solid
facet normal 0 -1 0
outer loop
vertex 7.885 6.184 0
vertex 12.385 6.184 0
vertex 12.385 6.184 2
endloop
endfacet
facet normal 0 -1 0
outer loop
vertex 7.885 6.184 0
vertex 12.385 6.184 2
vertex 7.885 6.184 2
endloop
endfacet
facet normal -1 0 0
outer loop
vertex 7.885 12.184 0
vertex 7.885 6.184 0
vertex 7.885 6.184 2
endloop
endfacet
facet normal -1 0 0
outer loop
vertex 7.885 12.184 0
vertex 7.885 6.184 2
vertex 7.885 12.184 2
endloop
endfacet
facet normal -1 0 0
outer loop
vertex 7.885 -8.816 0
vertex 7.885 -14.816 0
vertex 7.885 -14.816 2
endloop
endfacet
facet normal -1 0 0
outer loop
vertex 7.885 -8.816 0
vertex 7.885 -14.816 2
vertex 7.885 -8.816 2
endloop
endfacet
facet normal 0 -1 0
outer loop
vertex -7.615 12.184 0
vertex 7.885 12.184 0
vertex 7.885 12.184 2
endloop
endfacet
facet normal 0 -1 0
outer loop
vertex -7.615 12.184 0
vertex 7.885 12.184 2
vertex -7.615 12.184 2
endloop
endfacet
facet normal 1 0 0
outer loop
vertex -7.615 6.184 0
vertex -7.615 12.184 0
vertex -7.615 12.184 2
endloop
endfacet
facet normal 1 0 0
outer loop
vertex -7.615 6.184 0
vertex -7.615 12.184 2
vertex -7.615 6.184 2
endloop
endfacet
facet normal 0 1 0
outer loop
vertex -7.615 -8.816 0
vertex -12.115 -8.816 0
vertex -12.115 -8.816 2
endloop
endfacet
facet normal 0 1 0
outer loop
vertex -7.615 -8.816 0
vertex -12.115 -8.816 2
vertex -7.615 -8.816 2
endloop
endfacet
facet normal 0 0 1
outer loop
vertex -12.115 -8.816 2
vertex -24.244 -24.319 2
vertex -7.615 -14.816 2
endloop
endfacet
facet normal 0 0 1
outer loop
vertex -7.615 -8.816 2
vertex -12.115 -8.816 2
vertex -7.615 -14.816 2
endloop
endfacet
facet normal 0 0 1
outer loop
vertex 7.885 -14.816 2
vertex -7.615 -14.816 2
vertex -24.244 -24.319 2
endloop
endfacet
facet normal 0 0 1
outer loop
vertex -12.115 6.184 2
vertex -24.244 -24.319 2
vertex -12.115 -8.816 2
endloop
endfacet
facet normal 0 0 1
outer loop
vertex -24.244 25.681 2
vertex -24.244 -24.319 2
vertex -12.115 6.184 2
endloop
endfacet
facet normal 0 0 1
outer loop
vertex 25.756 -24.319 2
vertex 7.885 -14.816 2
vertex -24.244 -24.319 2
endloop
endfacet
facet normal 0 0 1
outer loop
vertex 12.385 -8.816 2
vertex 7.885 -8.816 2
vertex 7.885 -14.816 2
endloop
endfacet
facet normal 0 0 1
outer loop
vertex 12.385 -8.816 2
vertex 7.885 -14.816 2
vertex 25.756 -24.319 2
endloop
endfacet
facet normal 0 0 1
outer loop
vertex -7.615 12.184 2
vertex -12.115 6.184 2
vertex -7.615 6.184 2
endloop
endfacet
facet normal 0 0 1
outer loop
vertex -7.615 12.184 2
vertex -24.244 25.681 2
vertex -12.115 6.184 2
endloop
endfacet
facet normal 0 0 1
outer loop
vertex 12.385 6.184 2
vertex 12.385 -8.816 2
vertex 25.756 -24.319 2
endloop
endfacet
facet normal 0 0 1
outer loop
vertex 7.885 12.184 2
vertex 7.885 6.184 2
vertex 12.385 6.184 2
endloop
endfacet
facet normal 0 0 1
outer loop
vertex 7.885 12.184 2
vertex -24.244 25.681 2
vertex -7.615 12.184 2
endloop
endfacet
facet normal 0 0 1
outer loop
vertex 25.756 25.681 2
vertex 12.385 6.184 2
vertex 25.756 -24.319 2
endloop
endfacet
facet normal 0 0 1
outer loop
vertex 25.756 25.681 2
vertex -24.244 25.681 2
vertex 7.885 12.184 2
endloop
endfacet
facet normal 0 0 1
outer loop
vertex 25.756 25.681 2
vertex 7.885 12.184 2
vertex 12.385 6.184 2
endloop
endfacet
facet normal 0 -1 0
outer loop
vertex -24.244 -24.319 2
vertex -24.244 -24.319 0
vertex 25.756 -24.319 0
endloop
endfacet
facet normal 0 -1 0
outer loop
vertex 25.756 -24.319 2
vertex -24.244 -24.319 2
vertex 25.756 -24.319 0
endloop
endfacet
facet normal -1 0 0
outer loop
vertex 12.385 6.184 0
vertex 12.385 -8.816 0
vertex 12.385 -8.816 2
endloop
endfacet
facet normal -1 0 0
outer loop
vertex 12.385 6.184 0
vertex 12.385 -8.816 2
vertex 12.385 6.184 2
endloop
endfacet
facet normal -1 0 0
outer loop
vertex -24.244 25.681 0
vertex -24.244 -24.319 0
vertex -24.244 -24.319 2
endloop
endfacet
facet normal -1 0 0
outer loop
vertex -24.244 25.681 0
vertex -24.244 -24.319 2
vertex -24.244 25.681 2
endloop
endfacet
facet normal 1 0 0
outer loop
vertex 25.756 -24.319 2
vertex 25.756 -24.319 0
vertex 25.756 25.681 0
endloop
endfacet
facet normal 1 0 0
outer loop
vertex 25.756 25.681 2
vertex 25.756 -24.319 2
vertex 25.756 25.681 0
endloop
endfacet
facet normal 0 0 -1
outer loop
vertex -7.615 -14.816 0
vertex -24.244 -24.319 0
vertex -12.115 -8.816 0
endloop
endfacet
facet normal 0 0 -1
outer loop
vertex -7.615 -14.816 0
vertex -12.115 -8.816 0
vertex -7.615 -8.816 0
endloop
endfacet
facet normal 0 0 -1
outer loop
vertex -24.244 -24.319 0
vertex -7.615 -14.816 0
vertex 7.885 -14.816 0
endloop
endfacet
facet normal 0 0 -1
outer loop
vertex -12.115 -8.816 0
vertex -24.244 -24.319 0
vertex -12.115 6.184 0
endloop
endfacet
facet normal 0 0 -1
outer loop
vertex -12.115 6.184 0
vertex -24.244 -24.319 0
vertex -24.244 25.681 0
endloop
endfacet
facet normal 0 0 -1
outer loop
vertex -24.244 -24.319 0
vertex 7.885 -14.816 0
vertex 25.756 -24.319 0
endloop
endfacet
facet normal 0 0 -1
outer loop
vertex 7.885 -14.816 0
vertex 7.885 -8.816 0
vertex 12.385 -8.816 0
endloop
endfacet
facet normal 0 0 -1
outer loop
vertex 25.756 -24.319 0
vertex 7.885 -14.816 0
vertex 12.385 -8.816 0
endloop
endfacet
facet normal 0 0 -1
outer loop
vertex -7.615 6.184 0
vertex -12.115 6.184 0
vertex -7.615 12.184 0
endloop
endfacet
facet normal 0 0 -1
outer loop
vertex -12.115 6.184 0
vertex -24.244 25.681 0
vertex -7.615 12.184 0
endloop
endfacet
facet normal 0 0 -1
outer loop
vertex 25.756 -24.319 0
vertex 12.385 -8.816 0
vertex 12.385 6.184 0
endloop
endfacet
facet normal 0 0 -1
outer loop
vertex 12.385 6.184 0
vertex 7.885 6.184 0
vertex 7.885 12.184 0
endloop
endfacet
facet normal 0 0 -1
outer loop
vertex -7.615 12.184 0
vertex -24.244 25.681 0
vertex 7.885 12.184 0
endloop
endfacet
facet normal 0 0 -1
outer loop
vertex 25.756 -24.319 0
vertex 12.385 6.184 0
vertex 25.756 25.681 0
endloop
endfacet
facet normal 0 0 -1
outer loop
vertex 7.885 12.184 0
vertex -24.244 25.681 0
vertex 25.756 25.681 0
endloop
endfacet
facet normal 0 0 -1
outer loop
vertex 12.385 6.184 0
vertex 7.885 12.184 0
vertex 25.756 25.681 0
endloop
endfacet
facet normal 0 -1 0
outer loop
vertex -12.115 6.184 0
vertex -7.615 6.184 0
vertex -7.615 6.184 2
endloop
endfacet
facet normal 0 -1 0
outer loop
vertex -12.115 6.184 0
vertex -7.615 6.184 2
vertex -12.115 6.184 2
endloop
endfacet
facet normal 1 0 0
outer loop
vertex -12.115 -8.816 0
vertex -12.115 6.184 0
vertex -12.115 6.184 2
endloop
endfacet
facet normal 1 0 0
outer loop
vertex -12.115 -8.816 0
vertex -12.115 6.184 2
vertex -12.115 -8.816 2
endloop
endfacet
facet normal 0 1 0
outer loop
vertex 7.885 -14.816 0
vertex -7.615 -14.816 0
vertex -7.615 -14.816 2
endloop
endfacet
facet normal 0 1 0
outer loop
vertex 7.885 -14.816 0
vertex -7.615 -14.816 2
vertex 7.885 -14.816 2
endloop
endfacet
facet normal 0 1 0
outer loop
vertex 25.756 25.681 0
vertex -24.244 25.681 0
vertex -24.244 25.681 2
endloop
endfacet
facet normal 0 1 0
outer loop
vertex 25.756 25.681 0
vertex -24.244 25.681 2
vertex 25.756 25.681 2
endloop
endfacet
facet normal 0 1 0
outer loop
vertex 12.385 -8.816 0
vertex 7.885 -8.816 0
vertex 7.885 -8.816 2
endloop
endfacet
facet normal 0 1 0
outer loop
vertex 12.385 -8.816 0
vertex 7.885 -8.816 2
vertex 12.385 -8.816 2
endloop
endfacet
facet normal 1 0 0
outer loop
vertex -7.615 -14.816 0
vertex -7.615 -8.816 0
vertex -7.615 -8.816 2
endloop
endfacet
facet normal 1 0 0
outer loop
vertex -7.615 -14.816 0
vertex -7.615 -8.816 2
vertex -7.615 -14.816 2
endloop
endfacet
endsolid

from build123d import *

# Parameters (mm, degrees)
F0_W     = 50
F0_H     = 50
F1_DEPTH = 2
F3_DEPTH = 25


with BuildPart() as f1:
    # F0 (on Top) → F1 (new body)
    with BuildSketch(Plane.XY):
        with Locations((0.755886, 0.681318)):
            Rectangle(F0_W, F0_H)
    extrude(amount=F1_DEPTH)


with BuildPart() as f3:
    # F2 (on Top) → F3 (new body)
    with BuildSketch(Plane.XY):
        Polygon((7.885135, 12.183912), (-7.614865, 12.183912), (-7.614865, 6.183912), (-12.114865, 6.183912), (-12.114865, -8.816088), (-7.614865, -8.816088), (-7.614865, -14.816088), (7.885135, -14.816088), (7.885135, -8.816088), (12.385135, -8.816088), (12.385135, 6.183912), (7.885135, 6.183912), align=None)
    extrude(amount=F3_DEPTH)


with BuildPart() as f1_1:
    add(f1.part)

    # F4: cut F3
    add(f3.part, mode=Mode.SUBTRACT)


solid = f1_1.part
